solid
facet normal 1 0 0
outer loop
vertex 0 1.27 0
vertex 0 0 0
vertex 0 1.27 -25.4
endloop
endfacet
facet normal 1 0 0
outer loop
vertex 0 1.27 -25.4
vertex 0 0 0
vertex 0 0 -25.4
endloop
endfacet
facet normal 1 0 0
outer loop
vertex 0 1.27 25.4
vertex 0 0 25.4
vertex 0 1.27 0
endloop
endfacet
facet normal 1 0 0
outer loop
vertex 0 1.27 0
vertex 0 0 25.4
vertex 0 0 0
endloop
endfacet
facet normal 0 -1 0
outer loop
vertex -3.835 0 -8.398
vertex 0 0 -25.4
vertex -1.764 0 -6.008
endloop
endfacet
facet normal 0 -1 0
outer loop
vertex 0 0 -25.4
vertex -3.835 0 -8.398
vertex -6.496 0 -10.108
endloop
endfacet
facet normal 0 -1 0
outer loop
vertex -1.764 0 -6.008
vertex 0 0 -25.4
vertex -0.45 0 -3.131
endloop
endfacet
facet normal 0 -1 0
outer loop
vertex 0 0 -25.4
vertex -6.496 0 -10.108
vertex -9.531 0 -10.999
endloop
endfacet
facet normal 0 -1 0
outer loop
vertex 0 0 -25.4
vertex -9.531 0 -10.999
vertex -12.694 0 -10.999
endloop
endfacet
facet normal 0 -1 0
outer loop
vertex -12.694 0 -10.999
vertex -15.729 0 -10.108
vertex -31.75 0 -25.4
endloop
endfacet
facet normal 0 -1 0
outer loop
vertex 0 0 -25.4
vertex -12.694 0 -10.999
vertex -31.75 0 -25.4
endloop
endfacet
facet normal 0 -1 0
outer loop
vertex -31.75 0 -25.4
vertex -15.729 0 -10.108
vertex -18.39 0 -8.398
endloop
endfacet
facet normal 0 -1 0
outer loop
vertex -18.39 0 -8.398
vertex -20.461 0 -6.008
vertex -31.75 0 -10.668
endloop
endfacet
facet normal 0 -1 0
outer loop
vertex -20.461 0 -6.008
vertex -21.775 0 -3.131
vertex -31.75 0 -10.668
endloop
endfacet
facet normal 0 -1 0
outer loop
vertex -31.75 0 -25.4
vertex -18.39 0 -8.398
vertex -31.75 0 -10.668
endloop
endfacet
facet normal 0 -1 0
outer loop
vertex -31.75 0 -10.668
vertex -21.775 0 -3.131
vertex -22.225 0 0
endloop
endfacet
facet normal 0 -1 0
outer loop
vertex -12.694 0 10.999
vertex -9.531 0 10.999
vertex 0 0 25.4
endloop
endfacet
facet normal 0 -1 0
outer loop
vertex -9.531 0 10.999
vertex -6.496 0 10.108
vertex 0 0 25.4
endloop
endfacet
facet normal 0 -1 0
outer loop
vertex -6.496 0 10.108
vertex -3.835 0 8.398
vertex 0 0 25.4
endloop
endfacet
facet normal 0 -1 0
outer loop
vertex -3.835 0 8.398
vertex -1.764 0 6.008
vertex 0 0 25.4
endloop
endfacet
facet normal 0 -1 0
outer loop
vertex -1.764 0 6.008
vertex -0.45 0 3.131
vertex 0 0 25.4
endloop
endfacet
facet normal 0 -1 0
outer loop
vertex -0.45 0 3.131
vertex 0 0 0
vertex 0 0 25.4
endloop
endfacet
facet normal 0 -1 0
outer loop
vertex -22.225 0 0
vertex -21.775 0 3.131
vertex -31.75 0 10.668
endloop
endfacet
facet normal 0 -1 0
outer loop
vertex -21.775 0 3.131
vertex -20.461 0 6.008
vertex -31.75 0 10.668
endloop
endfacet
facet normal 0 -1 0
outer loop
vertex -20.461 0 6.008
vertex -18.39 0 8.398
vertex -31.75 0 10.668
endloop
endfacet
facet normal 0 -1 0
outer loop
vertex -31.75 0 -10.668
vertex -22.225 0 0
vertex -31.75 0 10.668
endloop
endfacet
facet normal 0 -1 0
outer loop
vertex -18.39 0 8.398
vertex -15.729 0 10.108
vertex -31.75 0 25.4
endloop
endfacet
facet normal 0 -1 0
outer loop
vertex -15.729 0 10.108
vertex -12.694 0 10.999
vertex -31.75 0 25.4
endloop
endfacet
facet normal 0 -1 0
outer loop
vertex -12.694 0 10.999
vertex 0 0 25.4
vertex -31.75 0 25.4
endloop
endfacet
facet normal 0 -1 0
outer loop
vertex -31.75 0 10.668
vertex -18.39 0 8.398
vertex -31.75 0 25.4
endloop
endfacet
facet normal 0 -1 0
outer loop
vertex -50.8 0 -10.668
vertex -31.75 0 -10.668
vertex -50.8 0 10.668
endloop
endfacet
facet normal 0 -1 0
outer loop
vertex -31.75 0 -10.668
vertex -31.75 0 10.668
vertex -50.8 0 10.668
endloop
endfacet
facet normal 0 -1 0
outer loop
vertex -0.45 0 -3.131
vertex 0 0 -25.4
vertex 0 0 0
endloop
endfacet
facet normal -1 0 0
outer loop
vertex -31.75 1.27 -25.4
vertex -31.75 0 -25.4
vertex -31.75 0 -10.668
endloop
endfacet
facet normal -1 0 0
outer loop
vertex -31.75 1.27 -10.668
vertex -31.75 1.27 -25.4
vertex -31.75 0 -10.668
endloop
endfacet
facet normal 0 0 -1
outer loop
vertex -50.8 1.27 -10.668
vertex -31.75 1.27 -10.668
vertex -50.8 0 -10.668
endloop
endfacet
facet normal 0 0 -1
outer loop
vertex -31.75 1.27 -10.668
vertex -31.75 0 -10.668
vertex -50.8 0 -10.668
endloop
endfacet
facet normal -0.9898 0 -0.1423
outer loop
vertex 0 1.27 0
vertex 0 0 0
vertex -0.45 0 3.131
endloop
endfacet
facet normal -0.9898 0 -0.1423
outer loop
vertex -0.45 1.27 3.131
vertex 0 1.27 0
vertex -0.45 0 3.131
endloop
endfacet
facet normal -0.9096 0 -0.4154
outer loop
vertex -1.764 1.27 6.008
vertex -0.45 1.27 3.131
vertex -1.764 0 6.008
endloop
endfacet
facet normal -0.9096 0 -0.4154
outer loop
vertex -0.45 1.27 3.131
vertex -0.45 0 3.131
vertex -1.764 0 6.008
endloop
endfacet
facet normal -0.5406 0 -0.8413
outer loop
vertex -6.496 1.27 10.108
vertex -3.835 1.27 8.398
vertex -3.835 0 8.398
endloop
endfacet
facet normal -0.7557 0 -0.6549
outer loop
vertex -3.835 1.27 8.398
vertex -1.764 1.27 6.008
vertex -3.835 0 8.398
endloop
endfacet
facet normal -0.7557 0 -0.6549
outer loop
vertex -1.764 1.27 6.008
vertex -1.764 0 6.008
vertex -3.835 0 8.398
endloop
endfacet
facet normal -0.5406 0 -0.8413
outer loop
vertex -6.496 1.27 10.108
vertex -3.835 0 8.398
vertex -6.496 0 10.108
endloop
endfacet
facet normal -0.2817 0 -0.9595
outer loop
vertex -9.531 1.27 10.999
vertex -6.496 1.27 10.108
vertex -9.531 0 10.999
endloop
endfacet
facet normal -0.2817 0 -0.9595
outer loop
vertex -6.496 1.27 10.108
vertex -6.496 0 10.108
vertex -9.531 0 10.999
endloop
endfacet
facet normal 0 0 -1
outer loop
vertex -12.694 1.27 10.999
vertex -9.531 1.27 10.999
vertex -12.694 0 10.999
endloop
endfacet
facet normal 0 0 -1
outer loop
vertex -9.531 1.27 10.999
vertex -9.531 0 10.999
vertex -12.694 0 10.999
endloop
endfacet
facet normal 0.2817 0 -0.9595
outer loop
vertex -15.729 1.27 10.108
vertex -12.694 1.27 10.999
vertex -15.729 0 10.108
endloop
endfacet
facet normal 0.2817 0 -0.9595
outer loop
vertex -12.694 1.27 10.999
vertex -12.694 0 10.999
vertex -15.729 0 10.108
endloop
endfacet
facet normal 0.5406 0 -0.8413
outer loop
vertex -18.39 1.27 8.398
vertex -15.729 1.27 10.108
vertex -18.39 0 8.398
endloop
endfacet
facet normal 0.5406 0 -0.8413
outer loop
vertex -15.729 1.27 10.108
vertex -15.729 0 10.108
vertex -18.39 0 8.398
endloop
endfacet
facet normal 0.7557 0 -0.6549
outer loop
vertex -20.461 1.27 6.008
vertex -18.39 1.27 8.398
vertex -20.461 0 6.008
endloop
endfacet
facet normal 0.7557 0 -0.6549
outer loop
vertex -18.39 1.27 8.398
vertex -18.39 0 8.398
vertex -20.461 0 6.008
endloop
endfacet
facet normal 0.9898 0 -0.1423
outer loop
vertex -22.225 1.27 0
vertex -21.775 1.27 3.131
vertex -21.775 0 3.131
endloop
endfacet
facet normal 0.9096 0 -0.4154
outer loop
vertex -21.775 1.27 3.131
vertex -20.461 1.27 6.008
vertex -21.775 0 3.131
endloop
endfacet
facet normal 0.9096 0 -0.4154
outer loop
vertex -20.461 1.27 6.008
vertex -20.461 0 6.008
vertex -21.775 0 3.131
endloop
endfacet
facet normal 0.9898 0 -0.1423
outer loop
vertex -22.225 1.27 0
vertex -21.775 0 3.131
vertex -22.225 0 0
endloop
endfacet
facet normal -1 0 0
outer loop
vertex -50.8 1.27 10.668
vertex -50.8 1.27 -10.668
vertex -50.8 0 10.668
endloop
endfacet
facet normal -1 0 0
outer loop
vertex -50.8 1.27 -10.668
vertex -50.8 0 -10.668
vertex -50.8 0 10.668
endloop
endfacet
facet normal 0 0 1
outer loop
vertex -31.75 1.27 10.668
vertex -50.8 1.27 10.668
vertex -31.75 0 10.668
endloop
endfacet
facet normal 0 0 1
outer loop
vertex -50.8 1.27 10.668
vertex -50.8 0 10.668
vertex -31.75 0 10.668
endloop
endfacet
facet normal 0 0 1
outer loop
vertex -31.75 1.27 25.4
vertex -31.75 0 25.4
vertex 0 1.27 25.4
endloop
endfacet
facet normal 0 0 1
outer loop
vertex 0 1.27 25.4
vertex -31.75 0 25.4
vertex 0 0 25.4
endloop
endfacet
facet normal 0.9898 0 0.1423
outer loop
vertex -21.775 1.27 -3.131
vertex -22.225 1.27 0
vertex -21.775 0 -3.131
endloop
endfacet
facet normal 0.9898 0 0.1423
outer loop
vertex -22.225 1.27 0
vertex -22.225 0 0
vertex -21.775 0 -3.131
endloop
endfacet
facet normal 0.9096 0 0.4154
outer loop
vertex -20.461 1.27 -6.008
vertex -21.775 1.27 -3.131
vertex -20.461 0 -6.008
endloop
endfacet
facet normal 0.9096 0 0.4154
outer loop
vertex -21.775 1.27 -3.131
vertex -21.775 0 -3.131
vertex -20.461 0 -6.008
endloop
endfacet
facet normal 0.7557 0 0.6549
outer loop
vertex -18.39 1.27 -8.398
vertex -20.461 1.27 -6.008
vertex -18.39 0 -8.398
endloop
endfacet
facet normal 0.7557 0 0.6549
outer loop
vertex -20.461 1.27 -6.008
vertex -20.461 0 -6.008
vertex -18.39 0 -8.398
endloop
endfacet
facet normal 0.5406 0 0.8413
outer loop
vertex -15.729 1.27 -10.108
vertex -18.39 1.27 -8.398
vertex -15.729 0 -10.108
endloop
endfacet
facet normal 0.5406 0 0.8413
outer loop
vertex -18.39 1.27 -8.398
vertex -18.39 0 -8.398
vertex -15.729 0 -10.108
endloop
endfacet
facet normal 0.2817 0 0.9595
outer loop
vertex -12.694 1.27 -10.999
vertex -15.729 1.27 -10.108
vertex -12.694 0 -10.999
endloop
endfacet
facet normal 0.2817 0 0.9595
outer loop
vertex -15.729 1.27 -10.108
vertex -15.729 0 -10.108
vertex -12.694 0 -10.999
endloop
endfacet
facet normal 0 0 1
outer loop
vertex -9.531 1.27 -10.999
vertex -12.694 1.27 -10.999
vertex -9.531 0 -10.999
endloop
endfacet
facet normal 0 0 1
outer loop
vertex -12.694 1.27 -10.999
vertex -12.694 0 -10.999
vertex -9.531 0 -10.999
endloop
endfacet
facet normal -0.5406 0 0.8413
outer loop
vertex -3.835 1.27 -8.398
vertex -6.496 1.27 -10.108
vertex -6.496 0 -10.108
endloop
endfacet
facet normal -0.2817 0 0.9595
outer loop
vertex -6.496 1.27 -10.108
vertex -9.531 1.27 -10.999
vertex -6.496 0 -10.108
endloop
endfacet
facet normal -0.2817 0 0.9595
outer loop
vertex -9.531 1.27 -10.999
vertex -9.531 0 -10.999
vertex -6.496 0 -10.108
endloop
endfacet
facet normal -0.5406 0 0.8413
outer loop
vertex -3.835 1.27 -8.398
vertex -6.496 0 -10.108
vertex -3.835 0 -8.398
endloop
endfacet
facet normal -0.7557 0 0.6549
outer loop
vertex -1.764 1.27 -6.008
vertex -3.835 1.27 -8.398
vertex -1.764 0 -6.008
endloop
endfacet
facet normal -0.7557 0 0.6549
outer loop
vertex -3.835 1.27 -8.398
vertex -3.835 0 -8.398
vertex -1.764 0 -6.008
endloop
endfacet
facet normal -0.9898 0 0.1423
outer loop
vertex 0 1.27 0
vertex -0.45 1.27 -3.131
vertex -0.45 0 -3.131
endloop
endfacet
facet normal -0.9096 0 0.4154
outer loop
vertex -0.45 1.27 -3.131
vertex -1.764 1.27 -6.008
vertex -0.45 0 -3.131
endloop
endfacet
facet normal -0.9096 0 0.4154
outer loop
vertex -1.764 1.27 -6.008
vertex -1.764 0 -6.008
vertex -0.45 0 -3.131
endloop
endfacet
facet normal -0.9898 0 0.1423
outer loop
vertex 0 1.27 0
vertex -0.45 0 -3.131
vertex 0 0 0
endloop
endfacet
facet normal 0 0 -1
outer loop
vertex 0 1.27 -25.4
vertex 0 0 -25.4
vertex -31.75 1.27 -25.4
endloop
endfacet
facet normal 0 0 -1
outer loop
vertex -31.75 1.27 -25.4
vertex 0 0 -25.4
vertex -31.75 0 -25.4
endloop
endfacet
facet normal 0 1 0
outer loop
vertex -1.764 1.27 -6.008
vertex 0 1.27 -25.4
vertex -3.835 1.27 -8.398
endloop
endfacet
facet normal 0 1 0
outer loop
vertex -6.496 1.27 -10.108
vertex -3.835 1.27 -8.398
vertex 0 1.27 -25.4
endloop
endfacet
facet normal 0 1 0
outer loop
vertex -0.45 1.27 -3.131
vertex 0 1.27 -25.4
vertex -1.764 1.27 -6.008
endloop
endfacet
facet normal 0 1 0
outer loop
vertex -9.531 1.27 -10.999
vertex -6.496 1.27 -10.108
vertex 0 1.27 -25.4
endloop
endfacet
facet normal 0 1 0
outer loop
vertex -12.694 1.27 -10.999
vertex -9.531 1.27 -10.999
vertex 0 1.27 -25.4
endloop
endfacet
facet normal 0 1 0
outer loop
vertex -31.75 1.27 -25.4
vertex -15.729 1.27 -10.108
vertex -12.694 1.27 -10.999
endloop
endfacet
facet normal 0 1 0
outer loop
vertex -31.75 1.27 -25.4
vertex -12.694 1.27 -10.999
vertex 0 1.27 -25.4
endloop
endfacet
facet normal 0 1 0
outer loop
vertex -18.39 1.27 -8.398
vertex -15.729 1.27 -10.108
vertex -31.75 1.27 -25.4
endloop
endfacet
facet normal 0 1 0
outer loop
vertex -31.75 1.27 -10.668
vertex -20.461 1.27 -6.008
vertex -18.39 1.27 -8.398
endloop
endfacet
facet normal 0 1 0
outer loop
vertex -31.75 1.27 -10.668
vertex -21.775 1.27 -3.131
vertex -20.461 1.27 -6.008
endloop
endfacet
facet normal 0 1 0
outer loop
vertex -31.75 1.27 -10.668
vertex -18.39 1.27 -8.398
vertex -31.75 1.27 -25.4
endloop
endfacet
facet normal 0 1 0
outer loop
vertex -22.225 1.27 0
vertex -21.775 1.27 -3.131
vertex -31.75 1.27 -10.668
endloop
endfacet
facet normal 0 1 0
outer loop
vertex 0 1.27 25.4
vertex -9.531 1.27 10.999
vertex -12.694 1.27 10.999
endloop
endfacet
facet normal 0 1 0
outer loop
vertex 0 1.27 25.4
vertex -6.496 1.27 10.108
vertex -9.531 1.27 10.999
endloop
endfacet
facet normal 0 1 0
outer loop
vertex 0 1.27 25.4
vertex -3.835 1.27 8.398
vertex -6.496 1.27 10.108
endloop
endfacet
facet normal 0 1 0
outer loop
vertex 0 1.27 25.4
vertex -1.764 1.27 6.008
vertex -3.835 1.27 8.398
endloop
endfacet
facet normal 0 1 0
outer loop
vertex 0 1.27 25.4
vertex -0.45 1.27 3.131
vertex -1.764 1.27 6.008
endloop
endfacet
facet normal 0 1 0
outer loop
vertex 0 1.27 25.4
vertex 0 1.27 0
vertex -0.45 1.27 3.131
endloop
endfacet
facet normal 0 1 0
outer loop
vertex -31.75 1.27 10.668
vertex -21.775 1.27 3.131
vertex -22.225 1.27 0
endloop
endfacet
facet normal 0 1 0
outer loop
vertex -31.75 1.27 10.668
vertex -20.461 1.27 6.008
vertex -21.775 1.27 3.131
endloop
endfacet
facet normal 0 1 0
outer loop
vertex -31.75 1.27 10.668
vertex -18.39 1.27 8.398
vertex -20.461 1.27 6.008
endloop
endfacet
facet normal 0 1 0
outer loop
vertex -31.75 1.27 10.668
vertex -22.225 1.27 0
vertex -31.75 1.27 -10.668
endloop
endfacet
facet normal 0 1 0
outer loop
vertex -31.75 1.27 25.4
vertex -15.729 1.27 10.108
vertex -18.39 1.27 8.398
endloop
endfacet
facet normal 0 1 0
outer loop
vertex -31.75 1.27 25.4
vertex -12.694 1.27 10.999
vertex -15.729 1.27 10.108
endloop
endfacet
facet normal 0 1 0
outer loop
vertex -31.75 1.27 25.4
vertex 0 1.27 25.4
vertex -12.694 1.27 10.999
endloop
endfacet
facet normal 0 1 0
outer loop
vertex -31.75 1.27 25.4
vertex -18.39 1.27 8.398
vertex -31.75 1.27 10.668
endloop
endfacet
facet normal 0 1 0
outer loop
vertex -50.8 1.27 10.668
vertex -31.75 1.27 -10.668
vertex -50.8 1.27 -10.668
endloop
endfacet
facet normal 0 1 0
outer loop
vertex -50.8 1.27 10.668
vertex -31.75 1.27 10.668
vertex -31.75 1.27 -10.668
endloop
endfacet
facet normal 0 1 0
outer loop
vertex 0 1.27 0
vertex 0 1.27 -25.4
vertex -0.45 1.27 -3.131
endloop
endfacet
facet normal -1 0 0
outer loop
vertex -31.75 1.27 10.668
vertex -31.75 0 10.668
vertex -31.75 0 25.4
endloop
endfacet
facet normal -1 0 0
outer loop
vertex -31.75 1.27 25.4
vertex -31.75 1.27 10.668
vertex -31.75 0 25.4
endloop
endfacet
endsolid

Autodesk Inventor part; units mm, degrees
ref_plane "YZ Plane" through (0, 0, 0) normal (1, 0, 0) x (0, 1, 0)
ref_plane "XZ Plane" through (0, 0, 0) normal (0, 1, 0) x (-1, 0, 0)
ref_plane "XY Plane" through (0, 0, 0) normal (0, 0, 1) x (1, 0, 0)
sketch "Sketch1" plane through (0, 0, 0) normal (0, 1, 0) x (-1, 0, 0)
  line L0 (0, 0) -> (0, -25.4)
  line L1 (0, -25.4) -> (31.75, -25.4)
  line L2 (31.75, -25.4) -> (31.75, -10.668)
  line L3 (31.75, -10.668) -> (50.8, -10.668)
  line L4 (50.8, -10.668) -> (50.8, 10.668)
  line L5 (50.8, 10.668) -> (31.75, 10.668)
  line L6 (31.75, 10.668) -> (31.75, 25.4)
  line L7 (31.75, 25.4) -> (0, 25.4)
  line L8 (0, 25.4) -> (0, 0)
  line L9 (0, 0) -> (11.1125, 0)
  circle A0 centre (11.1125, 0) radius 11.1125
  dimension "d0" = 25.4
  dimension "d1" = 31.75
  dimension "d2" = 14.732
  dimension "d3" = 19.05
  dimension "d4" = 21.336
  dimension "d5" = 19.05
  dimension "d6" = 14.732
  dimension "d8" = 11.1125
extrude "Extrusion1" add sketch "Sketch1" along normal blind 1.27
equation "\"d5\" = d3"
equation "\"d6\" = d2"
properties part number "Base"
